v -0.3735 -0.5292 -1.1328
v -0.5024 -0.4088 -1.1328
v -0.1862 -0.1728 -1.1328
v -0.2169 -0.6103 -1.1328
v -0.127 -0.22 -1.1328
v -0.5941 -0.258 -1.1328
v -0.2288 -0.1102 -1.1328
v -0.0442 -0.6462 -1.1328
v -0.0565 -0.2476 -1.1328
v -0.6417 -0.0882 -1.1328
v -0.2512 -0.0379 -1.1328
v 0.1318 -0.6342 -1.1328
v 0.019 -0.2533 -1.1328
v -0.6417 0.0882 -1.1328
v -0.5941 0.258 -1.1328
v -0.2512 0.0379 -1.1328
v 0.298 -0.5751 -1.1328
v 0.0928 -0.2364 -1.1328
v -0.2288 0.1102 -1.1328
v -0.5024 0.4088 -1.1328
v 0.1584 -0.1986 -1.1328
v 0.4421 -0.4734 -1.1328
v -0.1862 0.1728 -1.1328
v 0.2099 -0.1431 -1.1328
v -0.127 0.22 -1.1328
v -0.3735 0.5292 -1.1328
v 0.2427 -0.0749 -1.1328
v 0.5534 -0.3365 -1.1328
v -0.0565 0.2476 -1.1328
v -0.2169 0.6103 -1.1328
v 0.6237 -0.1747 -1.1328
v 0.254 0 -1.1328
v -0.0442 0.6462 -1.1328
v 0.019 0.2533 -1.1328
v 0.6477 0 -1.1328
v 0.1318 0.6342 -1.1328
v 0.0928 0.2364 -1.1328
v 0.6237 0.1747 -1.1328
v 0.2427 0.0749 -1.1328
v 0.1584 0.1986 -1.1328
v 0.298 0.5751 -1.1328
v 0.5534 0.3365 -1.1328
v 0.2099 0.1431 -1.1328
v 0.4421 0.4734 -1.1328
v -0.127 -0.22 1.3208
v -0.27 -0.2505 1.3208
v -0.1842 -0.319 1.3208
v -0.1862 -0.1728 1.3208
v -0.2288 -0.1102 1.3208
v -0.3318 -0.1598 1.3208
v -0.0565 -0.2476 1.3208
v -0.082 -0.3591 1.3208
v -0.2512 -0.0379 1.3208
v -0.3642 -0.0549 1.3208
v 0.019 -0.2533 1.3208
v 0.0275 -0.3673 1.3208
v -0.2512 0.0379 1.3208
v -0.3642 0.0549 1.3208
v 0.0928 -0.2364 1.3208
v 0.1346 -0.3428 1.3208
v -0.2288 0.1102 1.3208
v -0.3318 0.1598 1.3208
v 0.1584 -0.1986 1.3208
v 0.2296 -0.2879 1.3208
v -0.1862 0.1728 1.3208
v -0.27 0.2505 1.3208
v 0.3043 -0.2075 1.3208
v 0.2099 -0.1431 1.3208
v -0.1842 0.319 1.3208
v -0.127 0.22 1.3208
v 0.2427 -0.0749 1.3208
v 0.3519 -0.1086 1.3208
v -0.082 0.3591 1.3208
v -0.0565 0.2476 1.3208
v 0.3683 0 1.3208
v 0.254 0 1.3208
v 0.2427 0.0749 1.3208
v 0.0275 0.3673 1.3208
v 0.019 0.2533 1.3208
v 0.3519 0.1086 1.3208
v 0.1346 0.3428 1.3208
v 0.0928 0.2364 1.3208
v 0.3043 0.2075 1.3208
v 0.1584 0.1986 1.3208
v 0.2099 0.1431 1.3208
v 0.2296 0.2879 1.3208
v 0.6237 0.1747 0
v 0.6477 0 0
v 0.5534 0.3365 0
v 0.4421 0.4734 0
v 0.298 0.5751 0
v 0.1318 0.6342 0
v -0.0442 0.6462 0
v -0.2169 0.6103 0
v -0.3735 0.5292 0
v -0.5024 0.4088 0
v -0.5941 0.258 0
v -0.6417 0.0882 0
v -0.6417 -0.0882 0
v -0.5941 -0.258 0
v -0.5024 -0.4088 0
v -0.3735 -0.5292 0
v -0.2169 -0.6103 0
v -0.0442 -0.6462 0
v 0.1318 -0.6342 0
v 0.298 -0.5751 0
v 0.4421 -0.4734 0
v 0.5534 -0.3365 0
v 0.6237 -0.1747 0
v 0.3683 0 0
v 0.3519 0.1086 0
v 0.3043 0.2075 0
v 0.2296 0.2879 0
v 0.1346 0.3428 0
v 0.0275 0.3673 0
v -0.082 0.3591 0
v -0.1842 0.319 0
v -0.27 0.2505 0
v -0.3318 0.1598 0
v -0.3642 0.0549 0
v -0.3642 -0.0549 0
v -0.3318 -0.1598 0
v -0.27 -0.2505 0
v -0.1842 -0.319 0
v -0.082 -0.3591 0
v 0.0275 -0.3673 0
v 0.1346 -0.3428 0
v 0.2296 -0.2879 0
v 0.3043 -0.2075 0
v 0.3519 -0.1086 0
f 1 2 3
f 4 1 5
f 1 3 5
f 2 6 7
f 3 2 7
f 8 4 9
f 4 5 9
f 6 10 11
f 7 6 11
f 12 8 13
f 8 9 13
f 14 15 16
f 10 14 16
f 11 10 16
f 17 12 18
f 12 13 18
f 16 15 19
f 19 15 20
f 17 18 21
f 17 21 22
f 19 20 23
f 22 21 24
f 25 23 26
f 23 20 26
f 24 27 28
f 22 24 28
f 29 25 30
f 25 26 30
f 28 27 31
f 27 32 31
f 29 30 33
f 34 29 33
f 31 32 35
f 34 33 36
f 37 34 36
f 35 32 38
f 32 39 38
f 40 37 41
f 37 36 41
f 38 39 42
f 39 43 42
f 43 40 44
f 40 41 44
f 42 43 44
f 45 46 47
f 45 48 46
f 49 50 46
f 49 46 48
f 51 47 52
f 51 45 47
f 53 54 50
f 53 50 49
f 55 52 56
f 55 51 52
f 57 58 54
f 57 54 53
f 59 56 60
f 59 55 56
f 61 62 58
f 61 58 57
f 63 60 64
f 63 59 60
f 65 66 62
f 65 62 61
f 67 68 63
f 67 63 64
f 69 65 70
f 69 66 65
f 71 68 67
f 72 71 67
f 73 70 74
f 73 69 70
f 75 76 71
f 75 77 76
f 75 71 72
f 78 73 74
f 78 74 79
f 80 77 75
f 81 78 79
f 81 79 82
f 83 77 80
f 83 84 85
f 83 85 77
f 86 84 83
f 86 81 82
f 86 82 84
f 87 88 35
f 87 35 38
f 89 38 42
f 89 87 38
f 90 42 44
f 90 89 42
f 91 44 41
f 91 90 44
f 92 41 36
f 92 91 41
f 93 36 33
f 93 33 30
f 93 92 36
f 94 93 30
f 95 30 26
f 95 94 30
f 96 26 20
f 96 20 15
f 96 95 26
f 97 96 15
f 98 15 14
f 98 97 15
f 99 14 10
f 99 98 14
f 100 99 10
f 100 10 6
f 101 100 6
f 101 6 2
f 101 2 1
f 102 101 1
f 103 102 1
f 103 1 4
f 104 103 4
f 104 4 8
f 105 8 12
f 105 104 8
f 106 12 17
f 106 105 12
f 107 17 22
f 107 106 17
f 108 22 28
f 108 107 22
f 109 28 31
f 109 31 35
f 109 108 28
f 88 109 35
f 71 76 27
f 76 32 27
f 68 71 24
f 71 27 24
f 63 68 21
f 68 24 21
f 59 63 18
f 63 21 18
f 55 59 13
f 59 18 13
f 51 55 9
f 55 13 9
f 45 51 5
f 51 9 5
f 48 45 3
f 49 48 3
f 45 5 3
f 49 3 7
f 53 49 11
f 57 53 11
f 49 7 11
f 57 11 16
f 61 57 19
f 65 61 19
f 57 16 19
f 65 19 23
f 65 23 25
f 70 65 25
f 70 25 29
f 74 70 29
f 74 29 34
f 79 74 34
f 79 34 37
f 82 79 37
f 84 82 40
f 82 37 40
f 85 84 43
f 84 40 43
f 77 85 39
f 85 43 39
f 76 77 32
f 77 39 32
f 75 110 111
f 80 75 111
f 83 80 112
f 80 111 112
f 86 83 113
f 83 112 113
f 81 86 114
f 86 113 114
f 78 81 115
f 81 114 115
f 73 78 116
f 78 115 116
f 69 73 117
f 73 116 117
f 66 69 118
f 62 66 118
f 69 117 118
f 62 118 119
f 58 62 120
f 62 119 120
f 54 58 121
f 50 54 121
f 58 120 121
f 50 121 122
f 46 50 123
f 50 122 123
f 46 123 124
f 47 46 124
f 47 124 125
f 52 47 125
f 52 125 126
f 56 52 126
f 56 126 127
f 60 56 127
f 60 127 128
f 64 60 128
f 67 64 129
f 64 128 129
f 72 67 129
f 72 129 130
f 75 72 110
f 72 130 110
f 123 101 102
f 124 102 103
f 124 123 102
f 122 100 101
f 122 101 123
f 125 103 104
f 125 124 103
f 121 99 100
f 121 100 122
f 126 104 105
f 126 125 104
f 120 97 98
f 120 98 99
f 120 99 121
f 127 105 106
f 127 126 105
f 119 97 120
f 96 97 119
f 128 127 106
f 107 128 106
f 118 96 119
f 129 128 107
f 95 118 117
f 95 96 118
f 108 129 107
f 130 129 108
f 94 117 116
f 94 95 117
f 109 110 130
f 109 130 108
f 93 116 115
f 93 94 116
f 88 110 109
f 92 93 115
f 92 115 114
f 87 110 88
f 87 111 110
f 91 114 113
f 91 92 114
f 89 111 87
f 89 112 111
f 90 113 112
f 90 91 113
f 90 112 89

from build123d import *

# Parameters (mm, degrees)
SKETCH1_R          = 0.6477
SKETCH1_R_2        = 0.254
EXTRUDE1_DEPTH     = 1.13284
SKETCH2_R          = 0.3683
EXTRUDE2_DEPTH     = 1.3208
CUT_EXTRUDE1_REACH = 3.607
SKETCH4_R          = 0.254


with BuildPart() as part:
    # Sketch1 → Extrude1 (new body)
    with BuildSketch(Plane.XY):
        Circle(SKETCH1_R)
        Circle(SKETCH1_R_2, mode=Mode.SUBTRACT)
    extrude(amount=-EXTRUDE1_DEPTH)

    # Sketch2 → Extrude2 (add)
    with BuildSketch(Plane.XY):
        Circle(SKETCH2_R)
    extrude(amount=EXTRUDE2_DEPTH)

    # Sketch4 → Cut-Extrude1 (cut, up to next)
    with BuildSketch(Plane(origin=(0, 0, 0), x_dir=(-1, 0, 0), z_dir=(0, 0, -1)), mode=Mode.PRIVATE) as cut_extrude1_sk1:
        with Locations(Location((0, 0, 0), (0, 0, 180))):
            Circle(SKETCH4_R)
    cut_extrude1_tool1 = extrude(cut_extrude1_sk1.sketch, amount=-CUT_EXTRUDE1_REACH, mode=Mode.PRIVATE) & part.part
    add(cut_extrude1_tool1.solids().sort_by_distance((0, 0, 0))[0], mode=Mode.SUBTRACT)


solid = part.part
